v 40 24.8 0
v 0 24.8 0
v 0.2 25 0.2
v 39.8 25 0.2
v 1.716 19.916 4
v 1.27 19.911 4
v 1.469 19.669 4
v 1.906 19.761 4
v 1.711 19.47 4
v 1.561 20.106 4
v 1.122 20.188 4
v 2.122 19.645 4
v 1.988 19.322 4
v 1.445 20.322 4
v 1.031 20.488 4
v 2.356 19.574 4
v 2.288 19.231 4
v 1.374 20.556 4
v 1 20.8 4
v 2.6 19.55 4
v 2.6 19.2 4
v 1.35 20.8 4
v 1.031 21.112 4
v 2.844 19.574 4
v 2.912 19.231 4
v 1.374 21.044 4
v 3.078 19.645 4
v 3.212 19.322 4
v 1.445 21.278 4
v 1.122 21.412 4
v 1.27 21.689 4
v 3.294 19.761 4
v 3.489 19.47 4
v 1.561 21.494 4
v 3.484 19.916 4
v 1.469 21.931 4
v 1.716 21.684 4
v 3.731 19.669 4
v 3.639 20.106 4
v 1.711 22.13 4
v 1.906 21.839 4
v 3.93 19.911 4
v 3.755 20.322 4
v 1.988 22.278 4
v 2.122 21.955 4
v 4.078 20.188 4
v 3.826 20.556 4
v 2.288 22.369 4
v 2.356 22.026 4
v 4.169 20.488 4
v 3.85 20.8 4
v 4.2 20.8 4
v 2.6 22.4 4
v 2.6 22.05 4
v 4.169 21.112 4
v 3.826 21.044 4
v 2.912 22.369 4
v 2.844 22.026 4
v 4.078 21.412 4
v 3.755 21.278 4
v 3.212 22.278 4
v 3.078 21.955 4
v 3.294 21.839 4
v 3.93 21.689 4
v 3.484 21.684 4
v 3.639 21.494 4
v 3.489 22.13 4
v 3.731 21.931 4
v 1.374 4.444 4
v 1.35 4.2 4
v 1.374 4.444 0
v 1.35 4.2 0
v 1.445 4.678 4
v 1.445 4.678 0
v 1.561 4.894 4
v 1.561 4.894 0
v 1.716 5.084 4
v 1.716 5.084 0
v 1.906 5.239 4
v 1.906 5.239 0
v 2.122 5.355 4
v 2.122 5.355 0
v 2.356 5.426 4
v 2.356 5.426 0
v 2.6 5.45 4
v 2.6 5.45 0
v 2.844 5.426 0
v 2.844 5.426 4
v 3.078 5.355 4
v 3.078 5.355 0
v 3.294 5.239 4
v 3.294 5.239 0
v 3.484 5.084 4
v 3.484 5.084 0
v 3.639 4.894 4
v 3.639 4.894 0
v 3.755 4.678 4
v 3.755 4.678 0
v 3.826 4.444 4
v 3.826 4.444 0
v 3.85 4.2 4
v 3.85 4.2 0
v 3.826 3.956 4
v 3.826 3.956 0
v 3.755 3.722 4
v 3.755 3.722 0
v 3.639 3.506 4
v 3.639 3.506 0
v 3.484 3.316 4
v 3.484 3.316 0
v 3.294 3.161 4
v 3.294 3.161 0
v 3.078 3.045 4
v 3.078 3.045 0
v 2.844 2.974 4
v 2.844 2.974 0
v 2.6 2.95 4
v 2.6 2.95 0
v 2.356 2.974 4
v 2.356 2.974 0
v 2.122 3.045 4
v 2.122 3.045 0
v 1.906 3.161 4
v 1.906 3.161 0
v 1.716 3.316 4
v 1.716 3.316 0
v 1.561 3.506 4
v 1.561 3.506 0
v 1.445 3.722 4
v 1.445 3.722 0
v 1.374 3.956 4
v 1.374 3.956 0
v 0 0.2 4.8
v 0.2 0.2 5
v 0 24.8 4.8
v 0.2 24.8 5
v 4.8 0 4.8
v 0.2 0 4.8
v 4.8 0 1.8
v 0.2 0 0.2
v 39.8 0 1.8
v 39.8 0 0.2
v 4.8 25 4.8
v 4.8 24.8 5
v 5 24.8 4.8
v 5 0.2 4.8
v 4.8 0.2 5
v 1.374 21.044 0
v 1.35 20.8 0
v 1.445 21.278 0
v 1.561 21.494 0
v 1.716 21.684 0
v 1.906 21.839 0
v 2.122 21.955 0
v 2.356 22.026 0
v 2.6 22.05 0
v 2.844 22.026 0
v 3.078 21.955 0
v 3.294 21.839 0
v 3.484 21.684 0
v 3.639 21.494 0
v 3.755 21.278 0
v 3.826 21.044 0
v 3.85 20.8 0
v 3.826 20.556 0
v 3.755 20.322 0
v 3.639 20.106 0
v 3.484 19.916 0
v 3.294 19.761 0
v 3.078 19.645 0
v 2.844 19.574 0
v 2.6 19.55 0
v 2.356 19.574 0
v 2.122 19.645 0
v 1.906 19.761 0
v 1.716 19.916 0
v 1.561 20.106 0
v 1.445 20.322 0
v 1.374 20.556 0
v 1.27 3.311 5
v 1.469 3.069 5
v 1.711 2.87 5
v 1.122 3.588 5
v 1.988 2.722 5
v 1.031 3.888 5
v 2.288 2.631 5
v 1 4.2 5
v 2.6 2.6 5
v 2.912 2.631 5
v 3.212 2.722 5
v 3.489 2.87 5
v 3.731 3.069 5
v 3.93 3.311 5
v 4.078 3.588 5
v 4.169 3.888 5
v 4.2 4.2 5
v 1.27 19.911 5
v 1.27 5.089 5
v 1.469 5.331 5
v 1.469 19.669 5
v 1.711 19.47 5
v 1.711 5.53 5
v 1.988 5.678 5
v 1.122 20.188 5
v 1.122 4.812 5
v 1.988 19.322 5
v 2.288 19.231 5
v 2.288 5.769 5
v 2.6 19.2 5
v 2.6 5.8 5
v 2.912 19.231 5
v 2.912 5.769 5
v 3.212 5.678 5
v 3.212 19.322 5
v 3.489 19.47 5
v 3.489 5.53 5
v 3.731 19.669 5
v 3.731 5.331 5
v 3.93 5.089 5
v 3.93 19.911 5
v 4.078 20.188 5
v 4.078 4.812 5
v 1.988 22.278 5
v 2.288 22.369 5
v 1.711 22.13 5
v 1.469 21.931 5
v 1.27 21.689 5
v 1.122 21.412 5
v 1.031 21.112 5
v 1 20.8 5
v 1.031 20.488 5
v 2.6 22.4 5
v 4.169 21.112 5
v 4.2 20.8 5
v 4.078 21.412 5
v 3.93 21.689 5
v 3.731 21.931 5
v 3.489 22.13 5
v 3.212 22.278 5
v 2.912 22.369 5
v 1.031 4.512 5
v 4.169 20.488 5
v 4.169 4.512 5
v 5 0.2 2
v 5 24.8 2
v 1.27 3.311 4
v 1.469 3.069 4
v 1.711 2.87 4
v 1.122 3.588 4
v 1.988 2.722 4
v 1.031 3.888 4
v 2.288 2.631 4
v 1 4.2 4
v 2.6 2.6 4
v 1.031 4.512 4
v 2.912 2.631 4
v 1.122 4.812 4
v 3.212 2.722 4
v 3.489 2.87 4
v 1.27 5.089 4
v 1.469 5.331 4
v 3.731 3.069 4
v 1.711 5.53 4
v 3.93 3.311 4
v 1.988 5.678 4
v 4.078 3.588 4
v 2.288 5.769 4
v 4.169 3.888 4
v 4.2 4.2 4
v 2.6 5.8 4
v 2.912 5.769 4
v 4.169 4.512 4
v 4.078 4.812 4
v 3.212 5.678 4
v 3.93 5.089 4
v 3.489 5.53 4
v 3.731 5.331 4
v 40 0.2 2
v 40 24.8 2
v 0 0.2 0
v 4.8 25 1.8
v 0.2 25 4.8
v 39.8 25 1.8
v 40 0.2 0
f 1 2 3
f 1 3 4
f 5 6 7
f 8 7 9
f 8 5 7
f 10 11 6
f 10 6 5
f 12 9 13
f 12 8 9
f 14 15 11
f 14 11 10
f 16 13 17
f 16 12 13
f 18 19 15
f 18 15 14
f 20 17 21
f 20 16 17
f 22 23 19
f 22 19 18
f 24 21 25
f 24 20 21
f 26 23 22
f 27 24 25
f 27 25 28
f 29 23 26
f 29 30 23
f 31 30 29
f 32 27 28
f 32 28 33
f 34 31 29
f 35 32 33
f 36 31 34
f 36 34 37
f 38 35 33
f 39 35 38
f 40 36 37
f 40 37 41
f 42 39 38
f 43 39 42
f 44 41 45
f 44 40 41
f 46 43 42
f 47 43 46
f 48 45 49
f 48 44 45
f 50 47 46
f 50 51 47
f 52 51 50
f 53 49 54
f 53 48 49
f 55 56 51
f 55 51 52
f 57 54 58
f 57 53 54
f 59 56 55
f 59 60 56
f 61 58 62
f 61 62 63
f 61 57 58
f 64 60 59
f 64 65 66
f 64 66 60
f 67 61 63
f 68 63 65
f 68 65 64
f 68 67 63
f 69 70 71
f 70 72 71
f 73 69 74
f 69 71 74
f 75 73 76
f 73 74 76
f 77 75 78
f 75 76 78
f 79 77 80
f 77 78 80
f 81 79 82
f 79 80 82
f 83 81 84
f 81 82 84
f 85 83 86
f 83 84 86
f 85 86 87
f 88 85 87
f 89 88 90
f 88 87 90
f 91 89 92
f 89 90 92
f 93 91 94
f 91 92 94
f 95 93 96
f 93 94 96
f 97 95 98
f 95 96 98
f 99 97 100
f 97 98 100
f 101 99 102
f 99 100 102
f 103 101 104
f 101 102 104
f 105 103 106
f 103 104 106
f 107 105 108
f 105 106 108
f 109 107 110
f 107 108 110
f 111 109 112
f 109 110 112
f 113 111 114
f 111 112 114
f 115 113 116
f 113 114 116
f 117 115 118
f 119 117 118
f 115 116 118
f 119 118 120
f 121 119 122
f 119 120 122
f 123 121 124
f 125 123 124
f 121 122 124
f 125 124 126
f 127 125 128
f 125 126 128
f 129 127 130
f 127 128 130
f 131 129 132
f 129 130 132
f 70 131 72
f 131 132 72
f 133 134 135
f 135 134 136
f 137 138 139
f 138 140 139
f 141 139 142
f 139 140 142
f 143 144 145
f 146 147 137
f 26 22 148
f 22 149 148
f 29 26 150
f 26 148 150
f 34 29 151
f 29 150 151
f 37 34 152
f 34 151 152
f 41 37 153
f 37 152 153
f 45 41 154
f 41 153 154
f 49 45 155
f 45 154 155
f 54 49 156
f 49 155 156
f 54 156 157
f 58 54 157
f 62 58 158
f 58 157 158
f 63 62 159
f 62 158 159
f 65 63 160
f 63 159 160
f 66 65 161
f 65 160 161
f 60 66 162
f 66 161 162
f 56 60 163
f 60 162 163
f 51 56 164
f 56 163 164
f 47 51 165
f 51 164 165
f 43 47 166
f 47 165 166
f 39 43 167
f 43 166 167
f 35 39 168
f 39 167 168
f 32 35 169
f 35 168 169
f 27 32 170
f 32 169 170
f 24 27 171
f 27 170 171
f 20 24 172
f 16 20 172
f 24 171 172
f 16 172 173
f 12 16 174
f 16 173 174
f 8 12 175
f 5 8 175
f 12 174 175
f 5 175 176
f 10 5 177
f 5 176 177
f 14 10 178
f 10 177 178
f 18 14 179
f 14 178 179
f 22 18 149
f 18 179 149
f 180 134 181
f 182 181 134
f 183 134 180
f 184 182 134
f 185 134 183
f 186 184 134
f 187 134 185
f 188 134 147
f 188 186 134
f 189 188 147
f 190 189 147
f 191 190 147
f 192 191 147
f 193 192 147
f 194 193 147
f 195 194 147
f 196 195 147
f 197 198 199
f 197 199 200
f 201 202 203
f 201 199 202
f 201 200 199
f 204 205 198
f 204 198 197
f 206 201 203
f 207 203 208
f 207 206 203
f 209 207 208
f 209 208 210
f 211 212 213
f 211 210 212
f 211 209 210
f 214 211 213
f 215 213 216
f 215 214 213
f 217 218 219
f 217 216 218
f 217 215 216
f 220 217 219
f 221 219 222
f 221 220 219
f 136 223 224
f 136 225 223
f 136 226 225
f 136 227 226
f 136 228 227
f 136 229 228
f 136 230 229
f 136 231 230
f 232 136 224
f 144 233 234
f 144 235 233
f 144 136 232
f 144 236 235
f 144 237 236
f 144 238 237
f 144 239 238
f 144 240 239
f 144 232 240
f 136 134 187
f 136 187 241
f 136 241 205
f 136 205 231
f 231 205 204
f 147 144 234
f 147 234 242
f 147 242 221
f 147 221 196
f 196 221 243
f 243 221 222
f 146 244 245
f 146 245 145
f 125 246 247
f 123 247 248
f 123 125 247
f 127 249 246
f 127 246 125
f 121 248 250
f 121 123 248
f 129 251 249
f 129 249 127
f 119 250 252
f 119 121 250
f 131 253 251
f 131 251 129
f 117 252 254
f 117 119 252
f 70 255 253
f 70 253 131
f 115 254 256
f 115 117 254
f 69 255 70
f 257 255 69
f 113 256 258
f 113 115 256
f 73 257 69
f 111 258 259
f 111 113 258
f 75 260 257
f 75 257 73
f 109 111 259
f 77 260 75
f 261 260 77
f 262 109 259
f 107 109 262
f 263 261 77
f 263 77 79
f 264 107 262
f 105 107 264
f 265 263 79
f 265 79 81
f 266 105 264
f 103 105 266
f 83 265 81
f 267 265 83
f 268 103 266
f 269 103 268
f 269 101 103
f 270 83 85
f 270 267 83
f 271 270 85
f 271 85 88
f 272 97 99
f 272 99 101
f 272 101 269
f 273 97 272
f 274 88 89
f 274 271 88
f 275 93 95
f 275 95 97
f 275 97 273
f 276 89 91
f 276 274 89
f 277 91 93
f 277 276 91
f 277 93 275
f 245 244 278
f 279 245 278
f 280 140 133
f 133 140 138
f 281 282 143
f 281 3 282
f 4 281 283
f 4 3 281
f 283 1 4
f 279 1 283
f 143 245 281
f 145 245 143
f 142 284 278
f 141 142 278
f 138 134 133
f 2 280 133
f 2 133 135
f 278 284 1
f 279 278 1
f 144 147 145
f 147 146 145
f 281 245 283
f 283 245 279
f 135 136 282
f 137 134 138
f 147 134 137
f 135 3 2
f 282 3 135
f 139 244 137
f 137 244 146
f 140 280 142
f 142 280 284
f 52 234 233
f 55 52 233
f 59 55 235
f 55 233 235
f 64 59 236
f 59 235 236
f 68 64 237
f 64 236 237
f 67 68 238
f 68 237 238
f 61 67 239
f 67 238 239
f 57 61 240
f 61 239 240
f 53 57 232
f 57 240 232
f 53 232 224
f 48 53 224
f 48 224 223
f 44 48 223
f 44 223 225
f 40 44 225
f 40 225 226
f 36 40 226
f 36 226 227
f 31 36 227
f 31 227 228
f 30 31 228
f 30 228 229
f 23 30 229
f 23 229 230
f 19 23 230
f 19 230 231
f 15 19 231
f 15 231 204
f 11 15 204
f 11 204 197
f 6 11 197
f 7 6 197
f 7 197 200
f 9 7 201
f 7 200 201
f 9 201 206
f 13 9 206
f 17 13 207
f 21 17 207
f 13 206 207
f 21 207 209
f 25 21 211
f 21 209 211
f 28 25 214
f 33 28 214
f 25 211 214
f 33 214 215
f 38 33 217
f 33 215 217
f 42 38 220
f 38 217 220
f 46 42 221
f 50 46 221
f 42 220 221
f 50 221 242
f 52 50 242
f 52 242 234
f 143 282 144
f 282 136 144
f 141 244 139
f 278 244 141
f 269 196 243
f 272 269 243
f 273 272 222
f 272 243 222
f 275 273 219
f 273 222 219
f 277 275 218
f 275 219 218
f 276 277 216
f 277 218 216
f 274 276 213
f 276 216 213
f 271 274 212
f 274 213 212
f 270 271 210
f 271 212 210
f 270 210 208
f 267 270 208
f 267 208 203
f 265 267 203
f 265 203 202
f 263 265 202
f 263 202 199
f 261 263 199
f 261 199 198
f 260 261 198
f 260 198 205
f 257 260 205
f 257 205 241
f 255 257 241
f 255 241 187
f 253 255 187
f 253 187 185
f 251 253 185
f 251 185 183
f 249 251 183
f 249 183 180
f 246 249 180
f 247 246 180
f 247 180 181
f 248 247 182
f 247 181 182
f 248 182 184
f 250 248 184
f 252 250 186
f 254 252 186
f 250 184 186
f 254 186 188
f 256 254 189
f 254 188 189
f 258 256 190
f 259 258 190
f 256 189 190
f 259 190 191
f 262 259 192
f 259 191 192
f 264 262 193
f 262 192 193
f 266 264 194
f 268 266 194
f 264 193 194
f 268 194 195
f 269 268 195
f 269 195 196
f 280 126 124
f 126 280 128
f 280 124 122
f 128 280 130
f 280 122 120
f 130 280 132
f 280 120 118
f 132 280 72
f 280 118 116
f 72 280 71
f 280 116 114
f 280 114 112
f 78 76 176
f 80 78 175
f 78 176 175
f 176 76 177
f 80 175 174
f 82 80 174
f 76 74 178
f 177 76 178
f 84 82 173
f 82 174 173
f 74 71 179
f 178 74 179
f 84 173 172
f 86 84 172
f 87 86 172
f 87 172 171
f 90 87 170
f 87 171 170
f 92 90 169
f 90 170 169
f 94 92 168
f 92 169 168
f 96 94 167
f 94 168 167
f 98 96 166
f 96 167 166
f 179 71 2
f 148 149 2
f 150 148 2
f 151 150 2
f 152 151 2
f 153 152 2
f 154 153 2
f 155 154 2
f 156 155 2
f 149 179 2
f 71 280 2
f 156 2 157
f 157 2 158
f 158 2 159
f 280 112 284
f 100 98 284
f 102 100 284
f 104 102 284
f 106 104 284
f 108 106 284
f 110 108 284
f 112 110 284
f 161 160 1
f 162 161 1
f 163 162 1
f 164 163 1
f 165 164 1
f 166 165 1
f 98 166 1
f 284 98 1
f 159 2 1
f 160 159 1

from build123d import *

# Parameters (mm, degrees)
F0_W           = 40
F0_H           = 25
F1_DEPTH       = 5
F2_W           = 35
F2_H           = 3
F3_DEPTH       = 25
F4_SIZE        = 0.2
F7_D           = 2.5
F7_CBORE_D     = 3.2
F7_CBORE_DEPTH = 1
F8_D           = 2.5
F8_CBORE_D     = 3.2
F8_CBORE_DEPTH = 1


with BuildPart() as f1:
    # F0 (on Top) → F1 (new body)
    with BuildSketch(Plane.XY):
        with Locations((20, 12.5)):
            Rectangle(F0_W, F0_H)
    extrude(amount=F1_DEPTH)

    # F2 (on face) → F3 (cut)
    with BuildSketch(Plane.XZ):
        with Locations((22.5, 3.5)):
            Rectangle(F2_W, F2_H)
    extrude(amount=-F3_DEPTH, mode=Mode.SUBTRACT)

    # F4
    f4_edges = [f1.edges().sort_by_distance(p)[0] for p in [
        (2.5, 25, 5),
        (5, 12.5, 5),
        (2.5, 0, 5),
        (0, 12.5, 5),
        (20, 0, 0),
        (40, 0, 1),
        (22.5, 0, 2),
        (5, 0, 3.5),
        (0, 0, 2.5),
        (20, 25, 0),
        (0, 25, 2.5),
        (5, 25, 3.5),
        (22.5, 25, 2),
        (40, 25, 1),
    ]]
    chamfer(f4_edges, length=F4_SIZE)

    # F7 (through all)
    with Locations(Plane.XY.offset(5)):
        with Locations((2.6, 20.8)):
            CounterBoreHole(F7_D / 2, F7_CBORE_D / 2, F7_CBORE_DEPTH)

    # F8 (through all)
    with Locations(Plane.XY.offset(5)):
        with Locations((2.6, 4.2)):
            CounterBoreHole(F8_D / 2, F8_CBORE_D / 2, F8_CBORE_DEPTH)


solid = f1.part
